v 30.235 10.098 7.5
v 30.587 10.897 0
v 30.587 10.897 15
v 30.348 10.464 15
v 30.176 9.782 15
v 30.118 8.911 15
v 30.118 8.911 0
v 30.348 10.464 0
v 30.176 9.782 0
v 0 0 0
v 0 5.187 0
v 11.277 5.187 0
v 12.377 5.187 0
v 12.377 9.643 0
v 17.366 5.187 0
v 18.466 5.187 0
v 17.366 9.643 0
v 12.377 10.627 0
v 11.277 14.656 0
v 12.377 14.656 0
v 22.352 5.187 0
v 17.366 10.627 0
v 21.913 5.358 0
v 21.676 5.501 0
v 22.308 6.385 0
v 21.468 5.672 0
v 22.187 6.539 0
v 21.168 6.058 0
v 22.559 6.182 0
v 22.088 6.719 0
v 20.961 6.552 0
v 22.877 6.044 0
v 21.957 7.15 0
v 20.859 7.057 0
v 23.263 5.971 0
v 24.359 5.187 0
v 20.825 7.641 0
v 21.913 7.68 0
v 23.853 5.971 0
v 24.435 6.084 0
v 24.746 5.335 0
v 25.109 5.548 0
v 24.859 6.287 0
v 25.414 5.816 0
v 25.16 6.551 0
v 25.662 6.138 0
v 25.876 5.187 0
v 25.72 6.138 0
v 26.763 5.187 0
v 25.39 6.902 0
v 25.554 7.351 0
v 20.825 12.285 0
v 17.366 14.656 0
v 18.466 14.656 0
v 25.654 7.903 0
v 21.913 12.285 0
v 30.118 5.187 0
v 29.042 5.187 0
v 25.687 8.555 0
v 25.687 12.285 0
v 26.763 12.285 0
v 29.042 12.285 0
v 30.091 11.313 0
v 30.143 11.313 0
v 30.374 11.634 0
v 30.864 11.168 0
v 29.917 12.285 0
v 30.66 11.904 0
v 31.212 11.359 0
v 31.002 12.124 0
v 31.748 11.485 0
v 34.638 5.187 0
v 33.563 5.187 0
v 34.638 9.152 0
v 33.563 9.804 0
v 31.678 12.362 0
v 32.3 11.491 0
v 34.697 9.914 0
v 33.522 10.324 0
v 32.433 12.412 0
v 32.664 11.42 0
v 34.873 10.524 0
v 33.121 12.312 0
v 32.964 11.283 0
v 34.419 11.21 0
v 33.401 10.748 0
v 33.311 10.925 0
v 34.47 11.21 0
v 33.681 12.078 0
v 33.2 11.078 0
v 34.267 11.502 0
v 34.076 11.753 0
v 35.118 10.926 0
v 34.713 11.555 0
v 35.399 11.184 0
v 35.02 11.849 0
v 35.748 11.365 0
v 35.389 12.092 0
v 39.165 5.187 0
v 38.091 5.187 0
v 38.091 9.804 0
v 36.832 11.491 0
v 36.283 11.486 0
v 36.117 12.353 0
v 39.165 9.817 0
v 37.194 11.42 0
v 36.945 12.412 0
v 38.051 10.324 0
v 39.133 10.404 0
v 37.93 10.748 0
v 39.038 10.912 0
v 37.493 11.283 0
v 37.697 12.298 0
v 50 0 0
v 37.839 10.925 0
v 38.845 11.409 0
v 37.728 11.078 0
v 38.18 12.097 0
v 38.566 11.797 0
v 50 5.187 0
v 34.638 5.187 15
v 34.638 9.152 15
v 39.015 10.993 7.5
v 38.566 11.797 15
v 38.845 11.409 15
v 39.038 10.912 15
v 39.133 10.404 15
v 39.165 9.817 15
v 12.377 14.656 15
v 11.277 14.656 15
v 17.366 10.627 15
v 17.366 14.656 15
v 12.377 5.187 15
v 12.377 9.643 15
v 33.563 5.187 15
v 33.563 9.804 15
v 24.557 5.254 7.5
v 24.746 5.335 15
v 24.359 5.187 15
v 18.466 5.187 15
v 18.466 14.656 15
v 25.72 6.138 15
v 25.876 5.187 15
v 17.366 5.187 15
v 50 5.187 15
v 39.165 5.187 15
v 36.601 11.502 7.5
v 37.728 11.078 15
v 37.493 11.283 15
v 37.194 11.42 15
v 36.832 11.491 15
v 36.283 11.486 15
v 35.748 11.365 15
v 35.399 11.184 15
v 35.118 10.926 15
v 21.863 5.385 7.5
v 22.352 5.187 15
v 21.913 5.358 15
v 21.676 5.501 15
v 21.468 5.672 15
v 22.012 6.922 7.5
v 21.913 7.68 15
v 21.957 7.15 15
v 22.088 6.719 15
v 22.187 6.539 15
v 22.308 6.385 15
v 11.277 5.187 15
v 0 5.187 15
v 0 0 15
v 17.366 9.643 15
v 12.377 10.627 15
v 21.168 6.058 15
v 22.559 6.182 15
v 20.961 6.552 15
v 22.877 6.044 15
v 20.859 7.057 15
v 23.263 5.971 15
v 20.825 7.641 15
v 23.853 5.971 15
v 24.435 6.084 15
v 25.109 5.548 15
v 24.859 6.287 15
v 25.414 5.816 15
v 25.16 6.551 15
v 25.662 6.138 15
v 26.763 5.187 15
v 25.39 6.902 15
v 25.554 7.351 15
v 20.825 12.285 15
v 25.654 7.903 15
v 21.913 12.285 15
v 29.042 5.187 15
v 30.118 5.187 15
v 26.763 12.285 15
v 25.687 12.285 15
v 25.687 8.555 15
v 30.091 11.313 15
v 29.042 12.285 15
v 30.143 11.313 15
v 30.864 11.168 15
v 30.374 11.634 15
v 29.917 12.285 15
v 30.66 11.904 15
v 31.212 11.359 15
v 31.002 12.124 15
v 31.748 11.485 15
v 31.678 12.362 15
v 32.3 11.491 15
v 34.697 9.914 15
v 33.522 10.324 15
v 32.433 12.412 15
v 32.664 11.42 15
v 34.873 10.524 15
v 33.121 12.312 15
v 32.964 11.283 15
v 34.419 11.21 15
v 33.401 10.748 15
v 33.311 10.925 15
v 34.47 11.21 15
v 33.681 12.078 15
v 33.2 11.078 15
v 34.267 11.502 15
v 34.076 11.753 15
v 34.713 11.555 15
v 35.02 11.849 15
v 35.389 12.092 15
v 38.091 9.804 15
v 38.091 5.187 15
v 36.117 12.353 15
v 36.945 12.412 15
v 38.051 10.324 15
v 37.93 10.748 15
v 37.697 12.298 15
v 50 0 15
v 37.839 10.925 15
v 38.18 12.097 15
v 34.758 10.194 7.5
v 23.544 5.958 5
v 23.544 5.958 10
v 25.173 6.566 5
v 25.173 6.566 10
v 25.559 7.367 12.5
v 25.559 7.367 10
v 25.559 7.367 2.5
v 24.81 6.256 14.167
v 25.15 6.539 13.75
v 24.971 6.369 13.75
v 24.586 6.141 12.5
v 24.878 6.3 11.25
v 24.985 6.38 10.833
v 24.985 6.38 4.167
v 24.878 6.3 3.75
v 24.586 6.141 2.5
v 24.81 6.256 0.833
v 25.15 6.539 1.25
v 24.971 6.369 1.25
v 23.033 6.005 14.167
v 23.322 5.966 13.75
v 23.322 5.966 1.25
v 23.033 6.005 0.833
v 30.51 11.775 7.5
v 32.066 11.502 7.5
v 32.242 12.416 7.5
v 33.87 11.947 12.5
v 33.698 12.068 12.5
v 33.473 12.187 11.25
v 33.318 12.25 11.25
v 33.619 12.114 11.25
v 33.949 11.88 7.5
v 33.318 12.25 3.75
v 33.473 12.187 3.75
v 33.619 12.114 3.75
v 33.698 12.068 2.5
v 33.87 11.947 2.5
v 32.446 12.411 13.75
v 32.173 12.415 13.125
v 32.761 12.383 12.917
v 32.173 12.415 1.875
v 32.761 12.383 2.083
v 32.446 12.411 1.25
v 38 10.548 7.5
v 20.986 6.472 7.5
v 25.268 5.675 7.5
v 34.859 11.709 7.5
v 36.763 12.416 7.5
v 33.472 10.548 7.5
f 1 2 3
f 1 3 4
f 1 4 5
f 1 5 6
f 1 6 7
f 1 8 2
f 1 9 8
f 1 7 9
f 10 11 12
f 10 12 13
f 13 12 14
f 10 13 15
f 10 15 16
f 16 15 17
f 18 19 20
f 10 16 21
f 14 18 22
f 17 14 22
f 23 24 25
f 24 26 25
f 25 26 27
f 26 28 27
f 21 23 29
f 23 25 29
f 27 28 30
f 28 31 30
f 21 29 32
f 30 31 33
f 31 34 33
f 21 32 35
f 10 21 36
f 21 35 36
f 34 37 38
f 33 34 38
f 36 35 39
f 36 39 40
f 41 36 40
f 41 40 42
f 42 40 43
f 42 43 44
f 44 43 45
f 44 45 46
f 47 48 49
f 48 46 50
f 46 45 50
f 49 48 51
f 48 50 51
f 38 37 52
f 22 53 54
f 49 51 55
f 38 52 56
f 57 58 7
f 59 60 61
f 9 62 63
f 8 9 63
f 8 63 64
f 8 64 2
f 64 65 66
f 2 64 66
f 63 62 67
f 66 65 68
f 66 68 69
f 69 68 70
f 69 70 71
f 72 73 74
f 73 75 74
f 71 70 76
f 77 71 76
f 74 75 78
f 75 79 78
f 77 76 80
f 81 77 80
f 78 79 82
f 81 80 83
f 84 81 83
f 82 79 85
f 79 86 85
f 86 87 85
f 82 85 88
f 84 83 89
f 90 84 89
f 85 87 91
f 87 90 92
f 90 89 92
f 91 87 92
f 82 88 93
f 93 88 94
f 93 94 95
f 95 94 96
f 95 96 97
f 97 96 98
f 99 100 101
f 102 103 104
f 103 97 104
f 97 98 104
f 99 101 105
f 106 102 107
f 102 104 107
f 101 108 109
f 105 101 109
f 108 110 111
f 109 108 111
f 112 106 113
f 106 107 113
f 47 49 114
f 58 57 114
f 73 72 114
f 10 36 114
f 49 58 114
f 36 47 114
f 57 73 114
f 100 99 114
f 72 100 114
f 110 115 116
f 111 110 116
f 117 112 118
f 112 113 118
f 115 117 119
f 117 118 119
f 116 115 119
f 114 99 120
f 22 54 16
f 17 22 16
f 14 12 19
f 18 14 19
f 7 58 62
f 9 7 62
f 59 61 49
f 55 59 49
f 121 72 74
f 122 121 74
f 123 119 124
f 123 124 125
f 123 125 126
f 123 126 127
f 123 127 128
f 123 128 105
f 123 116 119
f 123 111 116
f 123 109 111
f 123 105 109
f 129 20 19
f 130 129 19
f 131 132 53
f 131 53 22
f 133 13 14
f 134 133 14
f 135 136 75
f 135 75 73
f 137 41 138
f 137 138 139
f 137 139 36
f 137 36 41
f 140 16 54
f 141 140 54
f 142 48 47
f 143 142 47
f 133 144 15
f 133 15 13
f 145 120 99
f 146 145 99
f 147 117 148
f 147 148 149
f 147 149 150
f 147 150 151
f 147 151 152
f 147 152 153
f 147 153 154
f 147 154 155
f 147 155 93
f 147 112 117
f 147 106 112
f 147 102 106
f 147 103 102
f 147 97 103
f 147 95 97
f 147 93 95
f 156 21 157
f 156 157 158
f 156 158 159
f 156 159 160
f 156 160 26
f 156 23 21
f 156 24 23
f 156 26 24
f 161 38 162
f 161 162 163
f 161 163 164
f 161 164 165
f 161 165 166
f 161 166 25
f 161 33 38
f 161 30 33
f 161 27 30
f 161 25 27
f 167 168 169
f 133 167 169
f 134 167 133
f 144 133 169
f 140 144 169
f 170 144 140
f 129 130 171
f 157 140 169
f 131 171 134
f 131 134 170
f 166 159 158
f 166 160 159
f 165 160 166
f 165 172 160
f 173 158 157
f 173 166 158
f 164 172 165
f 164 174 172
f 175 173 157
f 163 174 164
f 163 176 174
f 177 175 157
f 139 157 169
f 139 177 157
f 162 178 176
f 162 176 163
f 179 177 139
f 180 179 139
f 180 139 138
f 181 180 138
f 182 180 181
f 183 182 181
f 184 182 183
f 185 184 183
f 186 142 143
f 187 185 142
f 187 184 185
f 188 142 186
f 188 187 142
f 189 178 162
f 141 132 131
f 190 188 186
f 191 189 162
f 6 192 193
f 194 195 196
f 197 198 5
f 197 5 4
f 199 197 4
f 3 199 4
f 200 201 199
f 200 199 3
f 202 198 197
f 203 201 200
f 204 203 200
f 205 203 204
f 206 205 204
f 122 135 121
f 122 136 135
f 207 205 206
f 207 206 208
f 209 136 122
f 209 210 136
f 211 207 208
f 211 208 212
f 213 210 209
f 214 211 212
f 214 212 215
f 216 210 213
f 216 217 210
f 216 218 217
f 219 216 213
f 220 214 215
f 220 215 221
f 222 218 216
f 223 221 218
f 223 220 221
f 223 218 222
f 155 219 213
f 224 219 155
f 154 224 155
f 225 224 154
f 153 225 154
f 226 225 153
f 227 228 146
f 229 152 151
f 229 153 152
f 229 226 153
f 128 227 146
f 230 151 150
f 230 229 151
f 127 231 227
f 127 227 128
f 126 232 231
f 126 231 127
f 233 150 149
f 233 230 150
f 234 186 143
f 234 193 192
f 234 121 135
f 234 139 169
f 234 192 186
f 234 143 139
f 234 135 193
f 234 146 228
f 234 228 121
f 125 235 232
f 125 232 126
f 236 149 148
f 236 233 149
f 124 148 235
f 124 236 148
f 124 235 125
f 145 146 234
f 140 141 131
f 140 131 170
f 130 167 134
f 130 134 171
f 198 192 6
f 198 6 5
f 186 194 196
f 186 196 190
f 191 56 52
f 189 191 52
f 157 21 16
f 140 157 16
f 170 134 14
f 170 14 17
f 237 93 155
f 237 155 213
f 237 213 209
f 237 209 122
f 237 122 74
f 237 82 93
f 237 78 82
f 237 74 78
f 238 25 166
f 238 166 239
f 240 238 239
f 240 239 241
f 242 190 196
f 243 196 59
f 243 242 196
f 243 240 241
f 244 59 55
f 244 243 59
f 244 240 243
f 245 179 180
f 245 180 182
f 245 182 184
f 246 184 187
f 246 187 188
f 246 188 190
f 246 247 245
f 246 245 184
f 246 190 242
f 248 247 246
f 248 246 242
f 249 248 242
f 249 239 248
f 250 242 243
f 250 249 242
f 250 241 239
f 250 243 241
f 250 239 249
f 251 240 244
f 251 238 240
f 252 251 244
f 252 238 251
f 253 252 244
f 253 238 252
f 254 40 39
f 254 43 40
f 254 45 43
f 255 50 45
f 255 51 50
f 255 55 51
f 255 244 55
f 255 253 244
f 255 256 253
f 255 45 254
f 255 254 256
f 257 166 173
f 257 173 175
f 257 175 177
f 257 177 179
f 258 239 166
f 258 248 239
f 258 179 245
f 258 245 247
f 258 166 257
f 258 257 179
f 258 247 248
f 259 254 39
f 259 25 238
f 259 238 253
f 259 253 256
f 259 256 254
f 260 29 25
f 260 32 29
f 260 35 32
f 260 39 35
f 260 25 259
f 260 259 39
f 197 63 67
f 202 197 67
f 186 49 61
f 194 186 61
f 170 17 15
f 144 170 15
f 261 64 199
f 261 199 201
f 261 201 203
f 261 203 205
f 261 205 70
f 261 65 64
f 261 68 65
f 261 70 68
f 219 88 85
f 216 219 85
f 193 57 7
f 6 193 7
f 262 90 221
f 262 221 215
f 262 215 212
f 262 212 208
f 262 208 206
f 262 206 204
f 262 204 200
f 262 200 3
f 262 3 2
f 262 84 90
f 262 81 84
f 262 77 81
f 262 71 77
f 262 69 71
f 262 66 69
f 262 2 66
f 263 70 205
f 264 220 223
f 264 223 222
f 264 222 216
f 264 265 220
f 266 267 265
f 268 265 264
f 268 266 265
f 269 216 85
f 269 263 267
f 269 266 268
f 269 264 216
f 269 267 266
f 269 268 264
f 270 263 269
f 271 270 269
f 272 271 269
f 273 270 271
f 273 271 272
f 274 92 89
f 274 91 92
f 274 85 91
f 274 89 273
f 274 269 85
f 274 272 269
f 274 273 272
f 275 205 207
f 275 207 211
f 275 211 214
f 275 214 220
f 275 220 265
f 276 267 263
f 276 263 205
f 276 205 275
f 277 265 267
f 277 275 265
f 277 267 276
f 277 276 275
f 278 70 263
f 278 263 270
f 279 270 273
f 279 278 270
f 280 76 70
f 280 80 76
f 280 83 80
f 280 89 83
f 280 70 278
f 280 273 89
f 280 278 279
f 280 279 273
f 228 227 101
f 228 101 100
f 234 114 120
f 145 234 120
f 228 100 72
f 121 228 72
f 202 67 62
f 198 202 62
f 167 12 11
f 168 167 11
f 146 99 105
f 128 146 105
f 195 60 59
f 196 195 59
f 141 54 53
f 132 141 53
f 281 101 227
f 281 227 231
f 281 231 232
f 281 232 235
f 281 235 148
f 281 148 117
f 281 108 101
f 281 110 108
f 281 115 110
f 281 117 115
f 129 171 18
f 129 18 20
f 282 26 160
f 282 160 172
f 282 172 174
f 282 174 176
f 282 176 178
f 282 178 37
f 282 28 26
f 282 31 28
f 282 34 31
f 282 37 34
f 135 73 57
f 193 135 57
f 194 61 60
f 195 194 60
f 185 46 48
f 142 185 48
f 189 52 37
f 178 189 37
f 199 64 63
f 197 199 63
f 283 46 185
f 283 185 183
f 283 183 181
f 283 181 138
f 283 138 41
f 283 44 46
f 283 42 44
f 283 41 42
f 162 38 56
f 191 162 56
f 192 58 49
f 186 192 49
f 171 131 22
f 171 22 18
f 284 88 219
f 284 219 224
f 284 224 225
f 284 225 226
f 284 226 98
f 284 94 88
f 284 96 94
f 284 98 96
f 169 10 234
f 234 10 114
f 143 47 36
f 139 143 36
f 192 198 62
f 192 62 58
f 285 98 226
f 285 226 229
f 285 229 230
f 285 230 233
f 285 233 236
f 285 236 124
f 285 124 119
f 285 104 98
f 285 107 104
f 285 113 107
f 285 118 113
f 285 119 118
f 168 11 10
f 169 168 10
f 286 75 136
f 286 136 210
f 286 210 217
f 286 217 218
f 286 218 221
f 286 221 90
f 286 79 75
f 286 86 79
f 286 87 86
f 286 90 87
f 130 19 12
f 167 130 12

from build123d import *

# Parameters (mm, degrees)
F1_DEPTH = 15


with BuildPart() as f1:
    # F0 (on Top) → F1 (new body)
    with BuildSketch(Plane.XY):
        with BuildLine():
            Line((0, 5.1869419025), (0, 0))
            Line((0, 0), (50, 0))
            Line((50, 0), (50, 5.1869419025))
            Line((50, 5.1869419025), (39.1645775294, 5.1869419025))
            Line((39.1645775294, 5.1869419025), (38.091016748, 5.1869419025))
            Line((38.091016748, 5.1869419025), (34.6382131539, 5.1869419025))
            Line((34.6382131539, 5.1869419025), (33.5625798614, 5.1869419025))
            Line((33.5625798614, 5.1869419025), (30.1180663119, 5.1869419025))
            Line((30.1180663119, 5.1869419025), (29.0424330194, 5.1869419025))
            Line((29.0424330194, 5.1869419025), (26.7626707424, 5.1869419025))
            Line((26.7626707424, 5.1869419025), (25.8756359655, 5.1869419025))
            Line((25.8756359655, 5.1869419025), (24.3593894687, 5.1869419025))
            add(Edge.make_bspline(
                [(24.3593894687, 5.1869419025), (23.9221630132, 5.0563736994), (23.4072751728, 5.0563736994)],
                knots=[0.3156013684, 0.3156013684, 0.3156013684, 1, 1, 1], degree=2))
            add(Edge.make_bspline(
                [(23.4072751728, 5.0563736994), (22.8106948217, 5.0563736994), (22.3523760863, 5.1869419025)],
                knots=[0, 0, 0, 0.4605661865, 0.4605661865, 0.4605661865], degree=2))
            Line((22.3523760863, 5.1869419025), (18.4664085652, 5.1869419025))
            Line((18.4664085652, 5.1869419025), (17.3659051387, 5.1869419025))
            Line((17.3659051387, 5.1869419025), (12.3773707744, 5.1869419025))
            Line((12.3773707744, 5.1869419025), (11.2768673479, 5.1869419025))
            Line((11.2768673479, 5.1869419025), (0, 5.1869419025))
        make_face()
        Polygon((11.2768673479, 14.6562453968), (11.2768673479, 5.1869419025), (12.3773707744, 5.1869419025), (12.3773707744, 9.6428408985), (17.3659051387, 9.6428408985), (17.3659051387, 5.1869419025), (18.4664085652, 5.1869419025), (18.4664085652, 14.6562453968), (17.3659051387, 14.6562453968), (17.3659051387, 10.6272837), (12.3773707744, 10.6272837), (12.3773707744, 14.6562453968), align=None)
        with BuildLine():
            Line((38.091016748, 5.1869419025), (39.1645775294, 5.1869419025))
            Line((39.1645775294, 5.1869419025), (39.1645775294, 9.816931836))
            add(Edge.make_bspline(
                [(38.5656218039, 11.7972162503), (39.1645775294, 11.1785716688), (39.1645775294, 9.816931836)],
                knots=[0, 0, 0, 1, 1, 1], degree=2))
            add(Edge.make_bspline(
                [(36.7625370938, 12.4158608318), (37.9666660783, 12.4158608318), (38.5656218039, 11.7972162503)],
                knots=[0, 0, 0, 1, 1, 1], degree=2))
            add(Edge.make_bspline(
                [(35.3894984497, 12.0915128351), (35.991562942, 12.4158608318), (36.7625370938, 12.4158608318)],
                knots=[0, 0, 0, 1, 1, 1], degree=2))
            add(Edge.make_bspline(
                [(34.4703397499, 11.2096593362), (34.7874339575, 11.7671648385), (35.3894984497, 12.0915128351)],
                knots=[0, 0, 0, 1, 1, 1], degree=2))
            Line((34.4703397499, 11.2096593362), (34.4185269708, 11.2096593362))
            add(Edge.make_bspline(
                [(32.2423902519, 12.4158608318), (33.9066167141, 12.4158608318), (34.4185269708, 11.2096593362)],
                knots=[0, 0, 0, 1, 1, 1], degree=2))
            add(Edge.make_bspline(
                [(31.001992322, 12.1236367581), (31.5563890576, 12.4158608318), (32.2423902519, 12.4158608318)],
                knots=[0, 0, 0, 1, 1, 1], degree=2))
            add(Edge.make_bspline(
                [(30.1429364458, 11.3132848942), (30.4475955865, 11.8314126845), (31.001992322, 12.1236367581)],
                knots=[0, 0, 0, 1, 1, 1], degree=2))
            Line((30.1429364458, 11.3132848942), (30.0911236668, 11.3132848942))
            Line((30.0911236668, 11.3132848942), (29.9170327293, 12.2852926287))
            Line((29.9170327293, 12.2852926287), (29.0424330194, 12.2852926287))
            Line((29.0424330194, 12.2852926287), (29.0424330194, 5.1869419025))
            Line((29.0424330194, 5.1869419025), (30.1180663119, 5.1869419025))
            Line((30.1180663119, 5.1869419025), (30.1180663119, 8.9112444587))
            add(Edge.make_bspline(
                [(30.5874900899, 10.8967101509), (30.1180663119, 10.2915368919), (30.1180663119, 8.9112444587)],
                knots=[0, 0, 0, 1, 1, 1], degree=2))
            add(Edge.make_bspline(
                [(32.0662268032, 11.5018834099), (31.0569138678, 11.5018834099), (30.5874900899, 10.8967101509)],
                knots=[0, 0, 0, 1, 1, 1], degree=2))
            add(Edge.make_bspline(
                [(33.1998904082, 11.0780548775), (32.837200955, 11.5018834099), (32.0662268032, 11.5018834099)],
                knots=[0, 0, 0, 1, 1, 1], degree=2))
            add(Edge.make_bspline(
                [(33.5625798614, 9.8044967691), (33.5625798614, 10.654226345), (33.1998904082, 11.0780548775)],
                knots=[0, 0, 0, 1, 1, 1], degree=2))
            Line((33.5625798614, 9.8044967691), (33.5625798614, 5.1869419025))
            Line((33.5625798614, 5.1869419025), (34.6382131539, 5.1869419025))
            Line((34.6382131539, 5.1869419025), (34.6382131539, 9.1516557534))
            add(Edge.make_bspline(
                [(35.1179994877, 10.9257253071), (34.6382131539, 10.3495672044), (34.6382131539, 9.1516557534)],
                knots=[0, 0, 0, 1, 1, 1], degree=2))
            add(Edge.make_bspline(
                [(36.6008812233, 11.5018834099), (35.5977858214, 11.5018834099), (35.1179994877, 10.9257253071)],
                knots=[0, 0, 0, 1, 1, 1], degree=2))
            add(Edge.make_bspline(
                [(37.7283272948, 11.0780548775), (37.3656378417, 11.5018834099), (36.6008812233, 11.5018834099)],
                knots=[0, 0, 0, 1, 1, 1], degree=2))
            add(Edge.make_bspline(
                [(38.091016748, 9.8044967691), (38.091016748, 10.654226345), (37.7283272948, 11.0780548775)],
                knots=[0, 0, 0, 1, 1, 1], degree=2))
            Line((38.091016748, 9.8044967691), (38.091016748, 5.1869419025))
        make_face()
        with BuildLine():
            add(Edge.make_bspline(
                [(22.3523760863, 5.1869419025), (21.8155745788, 5.3398686822), (21.4684409818, 5.6719095142)],
                knots=[0.4605661865, 0.4605661865, 0.4605661865, 1, 1, 1], degree=2))
            Line((22.3523760863, 5.1869419025), (24.3593894687, 5.1869419025))
            add(Edge.make_bspline(
                [(24.7461173828, 5.3351264505), (24.5610106604, 5.2471517008), (24.3593894687, 5.1869419025)],
                knots=[0, 0, 0, 0.3156013684, 0.3156013684, 0.3156013684], degree=2))
            add(Edge.make_bspline(
                [(25.6621673159, 6.1382245254), (25.3326380413, 5.6138792017), (24.7461173828, 5.3351264505)],
                knots=[0, 0, 0, 1, 1, 1], degree=2))
            Line((25.6621673159, 6.1382245254), (25.7201976284, 6.1382245254))
            Line((25.7201976284, 6.1382245254), (25.8756359655, 5.1869419025))
            Line((25.8756359655, 5.1869419025), (26.7626707424, 5.1869419025))
            Line((26.7626707424, 5.1869419025), (26.7626707424, 12.2852926287))
            Line((26.7626707424, 12.2852926287), (25.6870374498, 12.2852926287))
            Line((25.6870374498, 12.2852926287), (25.6870374498, 8.554772539))
            add(Edge.make_bspline(
                [(25.1730546819, 6.5661980801), (25.6870374498, 7.1744801058), (25.6870374498, 8.554772539)],
                knots=[0, 0, 0, 1, 1, 1], degree=2))
            add(Edge.make_bspline(
                [(23.5440609094, 5.9579160544), (24.659071914, 5.9579160544), (25.1730546819, 6.5661980801)],
                knots=[0, 0, 0, 1, 1, 1], degree=2))
            add(Edge.make_bspline(
                [(22.307808002, 6.3848533535), (22.7026213781, 5.9579160544), (23.5440609094, 5.9579160544)],
                knots=[0, 0, 0, 1, 1, 1], degree=2))
            add(Edge.make_bspline(
                [(21.9129946258, 7.6801728291), (21.9129946258, 6.8117906527), (22.307808002, 6.3848533535)],
                knots=[0, 0, 0, 1, 1, 1], degree=2))
            Line((21.9129946258, 7.6801728291), (21.9129946258, 12.2852926287))
            Line((21.9129946258, 12.2852926287), (20.8249262663, 12.2852926287))
            Line((20.8249262663, 12.2852926287), (20.8249262663, 7.6407951171))
            add(Edge.make_bspline(
                [(21.4684409818, 5.6719095142), (20.8249262663, 6.287445329), (20.8249262663, 7.6407951171)],
                knots=[0, 0, 0, 1, 1, 1], degree=2))
        make_face()
        with BuildLine():
            Line((24.3593894687, 5.1869419025), (22.3523760863, 5.1869419025))
            add(Edge.make_bspline(
                [(23.4072751728, 5.0563736994), (22.8106948217, 5.0563736994), (22.3523760863, 5.1869419025)],
                knots=[0, 0, 0, 0.4605661865, 0.4605661865, 0.4605661865], degree=2))
            add(Edge.make_bspline(
                [(24.3593894687, 5.1869419025), (23.9221630132, 5.0563736994), (23.4072751728, 5.0563736994)],
                knots=[0.3156013684, 0.3156013684, 0.3156013684, 1, 1, 1], degree=2))
        make_face()
    extrude(amount=F1_DEPTH)


solid = f1.part
